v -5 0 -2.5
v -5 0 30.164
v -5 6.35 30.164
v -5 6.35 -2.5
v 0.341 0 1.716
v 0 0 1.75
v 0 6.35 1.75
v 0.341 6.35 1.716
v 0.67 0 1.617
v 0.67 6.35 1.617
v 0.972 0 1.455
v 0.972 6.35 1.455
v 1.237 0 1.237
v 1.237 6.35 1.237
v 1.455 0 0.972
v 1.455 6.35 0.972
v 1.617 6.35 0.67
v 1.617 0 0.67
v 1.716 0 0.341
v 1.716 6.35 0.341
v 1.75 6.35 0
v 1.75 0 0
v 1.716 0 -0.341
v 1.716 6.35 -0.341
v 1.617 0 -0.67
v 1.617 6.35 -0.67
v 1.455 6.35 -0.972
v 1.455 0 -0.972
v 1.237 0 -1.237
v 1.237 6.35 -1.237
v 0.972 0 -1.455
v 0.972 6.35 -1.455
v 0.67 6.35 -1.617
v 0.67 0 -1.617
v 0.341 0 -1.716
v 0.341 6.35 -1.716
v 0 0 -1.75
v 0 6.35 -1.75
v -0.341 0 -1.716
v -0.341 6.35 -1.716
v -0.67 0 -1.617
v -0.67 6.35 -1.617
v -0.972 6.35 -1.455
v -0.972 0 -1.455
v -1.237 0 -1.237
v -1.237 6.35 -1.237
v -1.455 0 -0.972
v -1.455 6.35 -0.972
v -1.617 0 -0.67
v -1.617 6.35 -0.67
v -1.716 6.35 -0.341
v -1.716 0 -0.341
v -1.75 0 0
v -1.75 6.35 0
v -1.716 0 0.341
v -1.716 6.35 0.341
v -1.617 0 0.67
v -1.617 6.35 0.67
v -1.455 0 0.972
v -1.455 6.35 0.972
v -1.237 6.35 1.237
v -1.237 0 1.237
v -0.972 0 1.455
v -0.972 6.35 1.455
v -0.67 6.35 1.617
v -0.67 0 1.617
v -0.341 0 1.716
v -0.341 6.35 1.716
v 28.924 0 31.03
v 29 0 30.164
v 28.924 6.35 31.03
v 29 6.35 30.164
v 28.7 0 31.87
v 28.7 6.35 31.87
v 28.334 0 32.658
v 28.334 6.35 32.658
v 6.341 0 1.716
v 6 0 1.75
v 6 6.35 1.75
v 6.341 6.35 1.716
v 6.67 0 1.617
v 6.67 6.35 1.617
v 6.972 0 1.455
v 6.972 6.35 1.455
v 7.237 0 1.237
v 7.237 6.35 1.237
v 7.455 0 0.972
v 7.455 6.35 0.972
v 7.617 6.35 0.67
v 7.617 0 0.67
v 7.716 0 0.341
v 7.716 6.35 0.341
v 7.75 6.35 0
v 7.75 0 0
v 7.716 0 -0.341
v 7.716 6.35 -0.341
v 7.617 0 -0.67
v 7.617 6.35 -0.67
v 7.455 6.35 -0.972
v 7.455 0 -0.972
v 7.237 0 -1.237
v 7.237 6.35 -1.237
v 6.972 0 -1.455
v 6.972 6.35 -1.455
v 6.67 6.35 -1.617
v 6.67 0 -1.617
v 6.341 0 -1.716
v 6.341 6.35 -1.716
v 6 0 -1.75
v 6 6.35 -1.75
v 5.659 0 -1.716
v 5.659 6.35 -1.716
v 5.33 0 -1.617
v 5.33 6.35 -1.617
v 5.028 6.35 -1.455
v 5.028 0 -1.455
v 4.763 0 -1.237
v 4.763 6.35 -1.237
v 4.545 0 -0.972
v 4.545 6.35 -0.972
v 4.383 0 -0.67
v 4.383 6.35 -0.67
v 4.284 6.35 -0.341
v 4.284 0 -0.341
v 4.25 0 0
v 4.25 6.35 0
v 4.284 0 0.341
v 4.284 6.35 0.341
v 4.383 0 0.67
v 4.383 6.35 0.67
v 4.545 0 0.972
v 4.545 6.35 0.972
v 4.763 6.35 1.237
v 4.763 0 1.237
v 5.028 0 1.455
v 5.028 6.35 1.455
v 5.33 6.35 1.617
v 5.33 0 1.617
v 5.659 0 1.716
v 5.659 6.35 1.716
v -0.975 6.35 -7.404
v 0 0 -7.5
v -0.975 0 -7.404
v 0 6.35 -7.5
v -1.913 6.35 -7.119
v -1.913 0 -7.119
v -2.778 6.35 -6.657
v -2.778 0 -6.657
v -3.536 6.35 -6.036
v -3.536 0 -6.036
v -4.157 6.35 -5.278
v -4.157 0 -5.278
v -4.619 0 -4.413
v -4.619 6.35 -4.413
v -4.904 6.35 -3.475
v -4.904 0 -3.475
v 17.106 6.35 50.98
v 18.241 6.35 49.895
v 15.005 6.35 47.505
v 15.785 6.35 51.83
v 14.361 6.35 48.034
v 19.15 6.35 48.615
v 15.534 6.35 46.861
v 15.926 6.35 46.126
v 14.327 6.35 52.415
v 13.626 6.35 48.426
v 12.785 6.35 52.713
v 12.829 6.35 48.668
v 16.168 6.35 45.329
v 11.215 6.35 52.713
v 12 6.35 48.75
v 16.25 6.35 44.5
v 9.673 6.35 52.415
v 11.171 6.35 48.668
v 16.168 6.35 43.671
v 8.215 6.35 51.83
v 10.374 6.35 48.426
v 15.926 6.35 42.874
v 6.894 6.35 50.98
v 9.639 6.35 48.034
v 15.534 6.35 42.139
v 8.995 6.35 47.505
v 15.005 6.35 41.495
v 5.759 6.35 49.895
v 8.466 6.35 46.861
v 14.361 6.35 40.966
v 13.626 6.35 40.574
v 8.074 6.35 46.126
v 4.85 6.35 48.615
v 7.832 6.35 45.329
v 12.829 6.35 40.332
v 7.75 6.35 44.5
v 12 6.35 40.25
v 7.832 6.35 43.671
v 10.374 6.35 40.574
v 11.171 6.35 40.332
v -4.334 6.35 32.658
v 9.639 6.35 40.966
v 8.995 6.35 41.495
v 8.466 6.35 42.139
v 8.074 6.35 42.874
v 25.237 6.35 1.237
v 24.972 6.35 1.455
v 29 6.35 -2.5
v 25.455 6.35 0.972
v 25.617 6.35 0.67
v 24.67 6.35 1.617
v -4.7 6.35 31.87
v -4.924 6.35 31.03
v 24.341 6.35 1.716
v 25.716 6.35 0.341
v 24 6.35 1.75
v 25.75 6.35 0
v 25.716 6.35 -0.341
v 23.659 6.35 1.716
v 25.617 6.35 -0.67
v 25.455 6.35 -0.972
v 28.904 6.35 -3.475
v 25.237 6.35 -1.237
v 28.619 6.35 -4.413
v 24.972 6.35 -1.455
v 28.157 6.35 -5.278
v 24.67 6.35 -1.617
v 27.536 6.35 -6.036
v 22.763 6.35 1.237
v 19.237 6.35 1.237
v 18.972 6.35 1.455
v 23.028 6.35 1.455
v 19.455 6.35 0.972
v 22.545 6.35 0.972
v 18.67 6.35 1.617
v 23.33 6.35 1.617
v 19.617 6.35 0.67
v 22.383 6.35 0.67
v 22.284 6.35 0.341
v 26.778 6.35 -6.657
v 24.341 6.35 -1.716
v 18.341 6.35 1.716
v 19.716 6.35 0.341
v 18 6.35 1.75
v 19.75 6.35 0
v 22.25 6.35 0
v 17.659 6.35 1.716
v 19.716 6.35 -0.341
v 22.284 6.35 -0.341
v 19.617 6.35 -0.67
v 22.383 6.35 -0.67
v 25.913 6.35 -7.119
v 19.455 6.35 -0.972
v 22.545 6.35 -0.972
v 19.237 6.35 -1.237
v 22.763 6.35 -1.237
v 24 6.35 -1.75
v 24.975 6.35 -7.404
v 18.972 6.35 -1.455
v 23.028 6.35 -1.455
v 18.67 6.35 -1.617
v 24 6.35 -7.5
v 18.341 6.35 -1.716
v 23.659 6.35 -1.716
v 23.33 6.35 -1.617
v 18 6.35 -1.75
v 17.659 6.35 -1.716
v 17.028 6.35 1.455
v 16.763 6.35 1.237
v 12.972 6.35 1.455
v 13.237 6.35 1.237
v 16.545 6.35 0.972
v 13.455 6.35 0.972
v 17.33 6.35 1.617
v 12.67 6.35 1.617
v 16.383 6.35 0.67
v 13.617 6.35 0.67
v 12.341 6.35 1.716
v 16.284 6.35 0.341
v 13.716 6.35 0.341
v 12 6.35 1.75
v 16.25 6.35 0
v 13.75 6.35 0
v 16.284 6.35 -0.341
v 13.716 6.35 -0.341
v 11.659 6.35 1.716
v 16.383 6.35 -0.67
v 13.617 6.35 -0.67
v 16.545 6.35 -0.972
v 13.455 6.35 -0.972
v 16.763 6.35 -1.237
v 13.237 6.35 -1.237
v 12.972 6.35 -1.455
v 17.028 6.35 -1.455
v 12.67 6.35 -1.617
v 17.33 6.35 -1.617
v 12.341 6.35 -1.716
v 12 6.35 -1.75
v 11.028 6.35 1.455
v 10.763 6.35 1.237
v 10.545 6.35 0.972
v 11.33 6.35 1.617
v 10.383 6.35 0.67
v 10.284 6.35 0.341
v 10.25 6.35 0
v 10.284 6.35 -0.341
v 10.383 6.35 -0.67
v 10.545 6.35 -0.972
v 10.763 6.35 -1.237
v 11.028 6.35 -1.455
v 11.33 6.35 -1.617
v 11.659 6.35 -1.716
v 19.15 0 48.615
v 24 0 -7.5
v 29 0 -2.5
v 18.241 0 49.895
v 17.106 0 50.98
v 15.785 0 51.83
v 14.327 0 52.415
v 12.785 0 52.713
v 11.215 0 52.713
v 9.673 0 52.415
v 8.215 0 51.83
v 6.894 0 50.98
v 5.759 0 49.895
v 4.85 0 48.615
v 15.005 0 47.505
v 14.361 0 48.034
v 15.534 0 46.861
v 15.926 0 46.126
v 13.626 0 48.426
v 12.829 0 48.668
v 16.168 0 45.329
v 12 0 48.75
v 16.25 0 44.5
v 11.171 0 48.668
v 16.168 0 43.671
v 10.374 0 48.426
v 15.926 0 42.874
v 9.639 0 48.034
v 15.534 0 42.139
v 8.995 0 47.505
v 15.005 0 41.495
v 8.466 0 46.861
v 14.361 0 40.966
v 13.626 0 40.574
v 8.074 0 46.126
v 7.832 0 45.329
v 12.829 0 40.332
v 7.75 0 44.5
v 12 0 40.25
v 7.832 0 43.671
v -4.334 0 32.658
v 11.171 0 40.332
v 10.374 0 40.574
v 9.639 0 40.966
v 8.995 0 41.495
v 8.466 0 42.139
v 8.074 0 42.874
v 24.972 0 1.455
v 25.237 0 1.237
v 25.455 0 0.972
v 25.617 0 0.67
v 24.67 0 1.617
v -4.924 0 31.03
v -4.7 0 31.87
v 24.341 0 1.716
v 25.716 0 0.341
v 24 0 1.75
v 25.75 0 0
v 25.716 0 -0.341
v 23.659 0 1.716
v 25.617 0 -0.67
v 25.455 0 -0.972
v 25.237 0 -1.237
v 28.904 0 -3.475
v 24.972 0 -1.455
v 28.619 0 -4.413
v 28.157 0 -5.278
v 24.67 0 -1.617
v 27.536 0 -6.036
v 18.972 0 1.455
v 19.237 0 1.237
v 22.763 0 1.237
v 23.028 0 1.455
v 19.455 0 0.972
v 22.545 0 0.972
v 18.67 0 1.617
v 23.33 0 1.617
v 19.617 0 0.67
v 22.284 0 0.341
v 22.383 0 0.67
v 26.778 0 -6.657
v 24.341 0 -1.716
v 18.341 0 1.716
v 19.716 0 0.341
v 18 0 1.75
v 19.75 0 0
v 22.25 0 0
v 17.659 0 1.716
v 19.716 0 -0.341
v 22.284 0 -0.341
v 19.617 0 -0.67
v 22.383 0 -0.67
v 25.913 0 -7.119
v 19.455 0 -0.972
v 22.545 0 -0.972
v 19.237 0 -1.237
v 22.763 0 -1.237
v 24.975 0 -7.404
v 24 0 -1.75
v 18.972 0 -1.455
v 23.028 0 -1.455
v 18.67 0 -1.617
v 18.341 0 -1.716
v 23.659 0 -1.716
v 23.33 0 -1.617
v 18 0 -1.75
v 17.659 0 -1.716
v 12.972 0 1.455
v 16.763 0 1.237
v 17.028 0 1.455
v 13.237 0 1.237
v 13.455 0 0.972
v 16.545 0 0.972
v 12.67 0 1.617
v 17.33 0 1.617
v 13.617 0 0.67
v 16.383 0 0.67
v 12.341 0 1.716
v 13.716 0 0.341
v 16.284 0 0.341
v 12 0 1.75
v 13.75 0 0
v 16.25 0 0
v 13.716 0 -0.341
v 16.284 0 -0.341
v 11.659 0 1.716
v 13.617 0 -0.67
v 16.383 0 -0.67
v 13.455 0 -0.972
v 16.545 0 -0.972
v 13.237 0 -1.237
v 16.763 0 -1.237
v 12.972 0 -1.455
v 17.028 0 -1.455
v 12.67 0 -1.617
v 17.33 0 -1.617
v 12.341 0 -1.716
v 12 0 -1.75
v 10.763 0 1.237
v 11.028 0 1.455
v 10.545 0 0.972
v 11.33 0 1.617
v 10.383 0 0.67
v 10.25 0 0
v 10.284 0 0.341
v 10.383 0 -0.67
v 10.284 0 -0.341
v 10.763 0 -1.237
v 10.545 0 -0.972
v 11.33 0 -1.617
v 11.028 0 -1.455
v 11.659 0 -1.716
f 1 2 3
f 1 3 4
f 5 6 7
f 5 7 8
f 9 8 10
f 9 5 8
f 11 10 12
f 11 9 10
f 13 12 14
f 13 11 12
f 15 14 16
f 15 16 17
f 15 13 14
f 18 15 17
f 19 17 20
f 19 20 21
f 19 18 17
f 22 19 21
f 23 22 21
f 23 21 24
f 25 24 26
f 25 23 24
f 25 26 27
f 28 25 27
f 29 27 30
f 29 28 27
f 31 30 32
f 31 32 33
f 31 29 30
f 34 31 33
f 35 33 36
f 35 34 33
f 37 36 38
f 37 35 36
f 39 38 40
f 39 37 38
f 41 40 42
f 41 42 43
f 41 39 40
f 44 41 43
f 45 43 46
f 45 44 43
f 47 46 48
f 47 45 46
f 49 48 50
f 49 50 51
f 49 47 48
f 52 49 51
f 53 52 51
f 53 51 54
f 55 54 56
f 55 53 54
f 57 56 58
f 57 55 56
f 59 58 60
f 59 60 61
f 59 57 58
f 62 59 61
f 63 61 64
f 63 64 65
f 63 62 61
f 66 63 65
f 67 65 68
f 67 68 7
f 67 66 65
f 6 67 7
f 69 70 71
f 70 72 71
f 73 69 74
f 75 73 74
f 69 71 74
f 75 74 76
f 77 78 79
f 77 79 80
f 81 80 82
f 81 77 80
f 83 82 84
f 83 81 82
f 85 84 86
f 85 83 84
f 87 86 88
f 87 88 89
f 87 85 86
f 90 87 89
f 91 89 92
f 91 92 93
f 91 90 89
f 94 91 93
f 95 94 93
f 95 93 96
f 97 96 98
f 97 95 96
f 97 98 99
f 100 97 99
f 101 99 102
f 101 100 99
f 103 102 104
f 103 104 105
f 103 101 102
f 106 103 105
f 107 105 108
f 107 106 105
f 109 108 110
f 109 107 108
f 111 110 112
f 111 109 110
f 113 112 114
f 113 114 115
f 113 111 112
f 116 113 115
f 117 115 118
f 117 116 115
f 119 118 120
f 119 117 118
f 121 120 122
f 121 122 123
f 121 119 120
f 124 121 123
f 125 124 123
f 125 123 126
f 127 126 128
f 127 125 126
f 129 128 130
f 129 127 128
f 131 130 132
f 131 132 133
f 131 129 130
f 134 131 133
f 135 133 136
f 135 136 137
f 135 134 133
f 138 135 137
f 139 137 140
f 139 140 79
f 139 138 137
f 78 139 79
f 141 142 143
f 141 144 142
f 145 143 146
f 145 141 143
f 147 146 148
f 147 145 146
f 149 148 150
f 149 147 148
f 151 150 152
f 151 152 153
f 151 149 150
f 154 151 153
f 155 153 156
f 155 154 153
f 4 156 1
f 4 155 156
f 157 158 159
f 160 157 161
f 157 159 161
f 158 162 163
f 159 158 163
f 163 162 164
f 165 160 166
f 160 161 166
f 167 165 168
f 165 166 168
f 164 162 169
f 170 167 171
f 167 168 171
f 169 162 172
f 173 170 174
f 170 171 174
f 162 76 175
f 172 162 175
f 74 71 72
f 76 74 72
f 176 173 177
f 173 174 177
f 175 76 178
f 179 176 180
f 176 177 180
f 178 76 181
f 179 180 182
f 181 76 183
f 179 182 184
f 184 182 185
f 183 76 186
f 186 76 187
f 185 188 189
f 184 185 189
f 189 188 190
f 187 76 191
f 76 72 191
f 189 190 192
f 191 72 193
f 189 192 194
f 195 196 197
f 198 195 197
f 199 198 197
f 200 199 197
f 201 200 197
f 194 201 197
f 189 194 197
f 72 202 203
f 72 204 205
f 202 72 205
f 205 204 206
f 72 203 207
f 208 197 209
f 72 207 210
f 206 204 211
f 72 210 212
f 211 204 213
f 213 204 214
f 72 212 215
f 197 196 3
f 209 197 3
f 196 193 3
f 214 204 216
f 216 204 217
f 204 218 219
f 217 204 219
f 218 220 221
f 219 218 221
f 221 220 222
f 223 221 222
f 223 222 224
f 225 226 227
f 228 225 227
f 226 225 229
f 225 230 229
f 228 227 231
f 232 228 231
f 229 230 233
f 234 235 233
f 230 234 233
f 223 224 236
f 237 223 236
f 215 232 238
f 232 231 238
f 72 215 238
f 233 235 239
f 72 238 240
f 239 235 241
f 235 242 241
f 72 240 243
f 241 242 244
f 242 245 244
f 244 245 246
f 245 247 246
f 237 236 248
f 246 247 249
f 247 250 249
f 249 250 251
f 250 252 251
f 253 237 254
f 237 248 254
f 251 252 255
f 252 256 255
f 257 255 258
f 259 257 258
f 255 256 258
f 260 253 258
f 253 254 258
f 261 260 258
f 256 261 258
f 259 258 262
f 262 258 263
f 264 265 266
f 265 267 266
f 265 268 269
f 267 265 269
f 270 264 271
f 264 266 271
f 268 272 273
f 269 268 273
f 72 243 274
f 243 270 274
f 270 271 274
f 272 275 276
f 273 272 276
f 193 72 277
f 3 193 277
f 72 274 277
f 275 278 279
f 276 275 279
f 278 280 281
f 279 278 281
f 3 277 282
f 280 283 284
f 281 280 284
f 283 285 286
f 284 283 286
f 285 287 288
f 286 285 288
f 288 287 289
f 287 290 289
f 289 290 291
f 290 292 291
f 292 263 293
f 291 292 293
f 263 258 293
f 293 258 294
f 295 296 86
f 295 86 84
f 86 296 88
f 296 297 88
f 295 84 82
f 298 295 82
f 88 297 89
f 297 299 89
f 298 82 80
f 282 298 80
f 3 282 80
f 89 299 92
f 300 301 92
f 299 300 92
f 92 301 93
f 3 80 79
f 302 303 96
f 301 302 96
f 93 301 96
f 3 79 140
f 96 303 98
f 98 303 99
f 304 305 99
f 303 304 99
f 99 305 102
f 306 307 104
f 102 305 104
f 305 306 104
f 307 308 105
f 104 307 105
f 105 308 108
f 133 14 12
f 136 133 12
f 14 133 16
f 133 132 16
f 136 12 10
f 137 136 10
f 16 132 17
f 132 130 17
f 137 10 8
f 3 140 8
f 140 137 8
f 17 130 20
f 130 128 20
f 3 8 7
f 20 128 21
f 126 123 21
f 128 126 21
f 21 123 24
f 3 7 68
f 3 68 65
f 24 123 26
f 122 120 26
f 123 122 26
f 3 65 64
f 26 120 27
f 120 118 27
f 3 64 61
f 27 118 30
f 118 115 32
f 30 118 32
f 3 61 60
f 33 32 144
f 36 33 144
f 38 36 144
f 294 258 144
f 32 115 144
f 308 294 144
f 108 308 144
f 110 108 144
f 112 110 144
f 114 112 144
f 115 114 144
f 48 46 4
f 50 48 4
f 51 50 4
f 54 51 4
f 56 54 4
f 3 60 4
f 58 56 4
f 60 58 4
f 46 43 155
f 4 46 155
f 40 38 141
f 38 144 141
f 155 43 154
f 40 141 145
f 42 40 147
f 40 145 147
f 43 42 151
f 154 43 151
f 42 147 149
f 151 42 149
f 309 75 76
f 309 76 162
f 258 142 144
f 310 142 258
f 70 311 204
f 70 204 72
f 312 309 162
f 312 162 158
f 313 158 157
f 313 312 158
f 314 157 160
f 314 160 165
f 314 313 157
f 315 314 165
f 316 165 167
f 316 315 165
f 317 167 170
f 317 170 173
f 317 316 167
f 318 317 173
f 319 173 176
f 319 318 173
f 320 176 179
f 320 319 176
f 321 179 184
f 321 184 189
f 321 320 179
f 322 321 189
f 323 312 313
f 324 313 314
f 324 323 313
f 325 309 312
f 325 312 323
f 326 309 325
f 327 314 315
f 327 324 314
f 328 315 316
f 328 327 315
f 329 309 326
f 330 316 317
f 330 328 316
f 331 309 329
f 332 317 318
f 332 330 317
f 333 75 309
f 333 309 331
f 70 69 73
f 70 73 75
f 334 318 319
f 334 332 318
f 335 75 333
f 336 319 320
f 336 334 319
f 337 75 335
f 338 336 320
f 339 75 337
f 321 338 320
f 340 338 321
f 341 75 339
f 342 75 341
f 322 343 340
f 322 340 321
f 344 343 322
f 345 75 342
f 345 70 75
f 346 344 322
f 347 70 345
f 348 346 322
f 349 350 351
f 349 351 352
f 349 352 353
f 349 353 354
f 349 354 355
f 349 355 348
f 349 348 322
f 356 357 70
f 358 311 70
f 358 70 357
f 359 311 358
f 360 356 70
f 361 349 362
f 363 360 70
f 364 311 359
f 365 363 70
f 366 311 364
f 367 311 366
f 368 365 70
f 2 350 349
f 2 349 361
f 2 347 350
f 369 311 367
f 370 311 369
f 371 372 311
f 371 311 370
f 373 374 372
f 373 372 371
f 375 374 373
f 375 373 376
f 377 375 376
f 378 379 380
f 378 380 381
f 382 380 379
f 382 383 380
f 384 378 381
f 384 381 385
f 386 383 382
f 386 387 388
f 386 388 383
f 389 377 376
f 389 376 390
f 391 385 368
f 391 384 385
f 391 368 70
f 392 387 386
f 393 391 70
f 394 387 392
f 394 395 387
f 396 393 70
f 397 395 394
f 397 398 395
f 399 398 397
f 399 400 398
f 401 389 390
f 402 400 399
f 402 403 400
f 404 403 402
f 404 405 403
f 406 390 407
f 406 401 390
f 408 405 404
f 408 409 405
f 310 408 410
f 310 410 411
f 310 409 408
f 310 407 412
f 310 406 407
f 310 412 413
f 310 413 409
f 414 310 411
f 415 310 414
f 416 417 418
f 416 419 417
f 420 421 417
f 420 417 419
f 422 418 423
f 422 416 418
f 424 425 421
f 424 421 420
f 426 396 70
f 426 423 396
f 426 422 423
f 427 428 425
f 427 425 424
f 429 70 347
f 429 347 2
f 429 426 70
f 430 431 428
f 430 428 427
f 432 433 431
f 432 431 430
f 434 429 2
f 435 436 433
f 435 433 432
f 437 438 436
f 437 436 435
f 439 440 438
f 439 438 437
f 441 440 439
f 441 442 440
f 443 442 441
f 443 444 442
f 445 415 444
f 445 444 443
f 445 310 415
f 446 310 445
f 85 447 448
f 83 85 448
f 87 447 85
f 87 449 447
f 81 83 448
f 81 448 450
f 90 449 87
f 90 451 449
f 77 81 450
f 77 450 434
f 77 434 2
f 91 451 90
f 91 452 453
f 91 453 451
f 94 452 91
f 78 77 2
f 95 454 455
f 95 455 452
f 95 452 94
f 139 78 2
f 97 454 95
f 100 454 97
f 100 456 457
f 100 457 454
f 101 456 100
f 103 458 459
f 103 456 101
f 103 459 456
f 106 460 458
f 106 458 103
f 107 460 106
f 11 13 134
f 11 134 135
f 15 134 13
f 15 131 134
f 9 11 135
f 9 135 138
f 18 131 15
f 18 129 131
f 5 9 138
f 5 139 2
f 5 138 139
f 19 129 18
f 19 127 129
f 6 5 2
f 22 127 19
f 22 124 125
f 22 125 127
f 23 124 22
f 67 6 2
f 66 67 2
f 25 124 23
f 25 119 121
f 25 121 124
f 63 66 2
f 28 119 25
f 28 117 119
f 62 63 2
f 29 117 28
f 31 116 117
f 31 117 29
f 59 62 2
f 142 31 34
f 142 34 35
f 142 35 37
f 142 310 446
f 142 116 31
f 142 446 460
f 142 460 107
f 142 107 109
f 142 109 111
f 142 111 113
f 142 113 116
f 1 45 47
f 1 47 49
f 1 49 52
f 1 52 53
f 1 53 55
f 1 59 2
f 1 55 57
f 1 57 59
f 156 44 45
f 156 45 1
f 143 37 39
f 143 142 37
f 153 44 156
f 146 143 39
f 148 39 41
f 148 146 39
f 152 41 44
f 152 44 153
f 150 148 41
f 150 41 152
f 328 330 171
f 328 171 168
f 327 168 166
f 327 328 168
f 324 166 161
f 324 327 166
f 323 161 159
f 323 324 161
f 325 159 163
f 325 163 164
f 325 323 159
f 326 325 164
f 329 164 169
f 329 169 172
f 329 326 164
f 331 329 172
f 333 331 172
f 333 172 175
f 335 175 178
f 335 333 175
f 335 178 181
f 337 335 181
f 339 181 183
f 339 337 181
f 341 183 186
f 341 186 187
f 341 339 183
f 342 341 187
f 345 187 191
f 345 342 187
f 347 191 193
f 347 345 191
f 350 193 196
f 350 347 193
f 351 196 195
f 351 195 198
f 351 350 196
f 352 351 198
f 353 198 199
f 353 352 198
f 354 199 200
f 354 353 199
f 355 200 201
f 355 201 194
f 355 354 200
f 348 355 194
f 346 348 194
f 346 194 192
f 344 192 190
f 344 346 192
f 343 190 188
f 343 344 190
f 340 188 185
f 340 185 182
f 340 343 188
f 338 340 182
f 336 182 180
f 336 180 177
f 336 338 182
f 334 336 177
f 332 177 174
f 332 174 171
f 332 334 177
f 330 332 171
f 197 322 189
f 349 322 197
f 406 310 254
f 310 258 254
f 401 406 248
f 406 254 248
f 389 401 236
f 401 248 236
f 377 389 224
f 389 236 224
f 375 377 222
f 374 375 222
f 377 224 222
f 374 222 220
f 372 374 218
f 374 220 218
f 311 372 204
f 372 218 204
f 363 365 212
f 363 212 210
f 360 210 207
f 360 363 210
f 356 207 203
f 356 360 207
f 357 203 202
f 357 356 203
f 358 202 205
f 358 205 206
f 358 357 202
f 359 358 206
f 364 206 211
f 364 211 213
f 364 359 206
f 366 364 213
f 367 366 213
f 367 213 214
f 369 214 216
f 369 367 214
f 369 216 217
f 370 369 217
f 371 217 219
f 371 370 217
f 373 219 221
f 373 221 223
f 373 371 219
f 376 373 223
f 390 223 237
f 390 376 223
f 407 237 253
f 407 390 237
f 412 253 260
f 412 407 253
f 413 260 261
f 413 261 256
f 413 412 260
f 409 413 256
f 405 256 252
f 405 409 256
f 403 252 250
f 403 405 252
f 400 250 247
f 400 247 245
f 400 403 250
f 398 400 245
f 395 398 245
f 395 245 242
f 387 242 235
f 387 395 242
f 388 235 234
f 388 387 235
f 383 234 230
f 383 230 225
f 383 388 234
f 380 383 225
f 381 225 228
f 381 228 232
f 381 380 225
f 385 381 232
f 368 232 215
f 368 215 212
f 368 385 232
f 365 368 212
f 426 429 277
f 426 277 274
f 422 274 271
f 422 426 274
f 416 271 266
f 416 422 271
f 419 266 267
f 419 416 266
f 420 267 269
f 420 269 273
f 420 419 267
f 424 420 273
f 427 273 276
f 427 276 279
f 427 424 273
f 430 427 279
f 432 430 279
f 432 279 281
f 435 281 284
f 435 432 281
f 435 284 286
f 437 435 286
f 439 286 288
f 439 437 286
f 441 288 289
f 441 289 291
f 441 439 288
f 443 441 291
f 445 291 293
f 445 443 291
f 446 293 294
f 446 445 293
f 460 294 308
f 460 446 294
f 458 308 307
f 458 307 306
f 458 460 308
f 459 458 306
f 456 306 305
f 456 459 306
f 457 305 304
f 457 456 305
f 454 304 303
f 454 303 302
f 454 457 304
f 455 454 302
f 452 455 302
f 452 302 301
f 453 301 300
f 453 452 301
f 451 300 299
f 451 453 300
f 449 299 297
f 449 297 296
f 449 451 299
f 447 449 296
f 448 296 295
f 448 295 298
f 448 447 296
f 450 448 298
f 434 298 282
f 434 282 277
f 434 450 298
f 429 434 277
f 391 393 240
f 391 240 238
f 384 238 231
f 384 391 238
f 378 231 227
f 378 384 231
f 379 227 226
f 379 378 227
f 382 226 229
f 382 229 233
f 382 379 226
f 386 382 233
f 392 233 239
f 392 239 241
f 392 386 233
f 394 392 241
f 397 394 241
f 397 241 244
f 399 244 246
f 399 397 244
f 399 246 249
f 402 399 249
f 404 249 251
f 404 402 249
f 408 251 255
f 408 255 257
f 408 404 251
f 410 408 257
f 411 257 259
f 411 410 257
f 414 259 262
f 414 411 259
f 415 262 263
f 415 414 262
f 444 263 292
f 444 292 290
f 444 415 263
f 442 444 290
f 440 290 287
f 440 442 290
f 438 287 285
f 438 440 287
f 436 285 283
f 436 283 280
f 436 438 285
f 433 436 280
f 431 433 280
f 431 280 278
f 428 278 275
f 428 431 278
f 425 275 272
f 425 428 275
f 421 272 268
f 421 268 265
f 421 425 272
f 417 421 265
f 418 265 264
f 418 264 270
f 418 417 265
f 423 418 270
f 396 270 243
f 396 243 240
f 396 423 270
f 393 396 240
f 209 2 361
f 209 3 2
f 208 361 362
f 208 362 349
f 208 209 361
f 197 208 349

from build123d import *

# Parameters (mm, degrees)
SKETCH1_R           = 1.75
SKETCH1_R_2         = 4.25
BOSS_EXTRUDE1_DEPTH = 6.35
FILLET1_R           = 5


with BuildPart() as part:
    # Sketch1 → Boss-Extrude1 (new body)
    with BuildSketch(Plane(origin=(0, 0, 0), x_dir=(1, 0, 0), z_dir=(0, 1, 0))):
        with BuildLine():
            Line((-5, 7.5), (29, 7.5))
            Line((29, 7.5), (29, -31.5))
            Line((29, -31.5), (19.150459769, -48.615024313))
            ThreePointArc((19.150459769, -48.615024313), (12, -52.75), (4.849540231, -48.615024313))
            Line((4.849540231, -48.615024313), (-5, -31.5))
            Line((-5, -31.5), (-5, 7.5))
        make_face()
        with Locations(Location((0, 0, 0), (0, 0, 270))):
            Circle(SKETCH1_R, mode=Mode.SUBTRACT)
        with Locations(Location((6, 0, 0), (0, 0, 270))):
            Circle(SKETCH1_R, mode=Mode.SUBTRACT)
        with Locations(Location((12, 0, 0), (0, 0, 270))):
            Circle(SKETCH1_R, mode=Mode.SUBTRACT)
        with Locations(Location((18, 0, 0), (0, 0, 270))):
            Circle(SKETCH1_R, mode=Mode.SUBTRACT)
        with Locations(Location((24, 0, 0), (0, 0, 270))):
            Circle(SKETCH1_R, mode=Mode.SUBTRACT)
        with Locations(Location((12, -44.5, 0), (0, 0, 270))):
            Circle(SKETCH1_R_2, mode=Mode.SUBTRACT)
    extrude(amount=BOSS_EXTRUDE1_DEPTH)

    # Fillet1
    fillet1_edges = [part.edges().sort_by_distance(p)[0] for p in [
        (29, 3.175, 31.5),
        (-5, 3.175, 31.5),
        (-5, 3.175, -7.5),
        (29, 3.175, -7.5),
    ]]
    fillet(fillet1_edges, radius=FILLET1_R)


solid = part.part
